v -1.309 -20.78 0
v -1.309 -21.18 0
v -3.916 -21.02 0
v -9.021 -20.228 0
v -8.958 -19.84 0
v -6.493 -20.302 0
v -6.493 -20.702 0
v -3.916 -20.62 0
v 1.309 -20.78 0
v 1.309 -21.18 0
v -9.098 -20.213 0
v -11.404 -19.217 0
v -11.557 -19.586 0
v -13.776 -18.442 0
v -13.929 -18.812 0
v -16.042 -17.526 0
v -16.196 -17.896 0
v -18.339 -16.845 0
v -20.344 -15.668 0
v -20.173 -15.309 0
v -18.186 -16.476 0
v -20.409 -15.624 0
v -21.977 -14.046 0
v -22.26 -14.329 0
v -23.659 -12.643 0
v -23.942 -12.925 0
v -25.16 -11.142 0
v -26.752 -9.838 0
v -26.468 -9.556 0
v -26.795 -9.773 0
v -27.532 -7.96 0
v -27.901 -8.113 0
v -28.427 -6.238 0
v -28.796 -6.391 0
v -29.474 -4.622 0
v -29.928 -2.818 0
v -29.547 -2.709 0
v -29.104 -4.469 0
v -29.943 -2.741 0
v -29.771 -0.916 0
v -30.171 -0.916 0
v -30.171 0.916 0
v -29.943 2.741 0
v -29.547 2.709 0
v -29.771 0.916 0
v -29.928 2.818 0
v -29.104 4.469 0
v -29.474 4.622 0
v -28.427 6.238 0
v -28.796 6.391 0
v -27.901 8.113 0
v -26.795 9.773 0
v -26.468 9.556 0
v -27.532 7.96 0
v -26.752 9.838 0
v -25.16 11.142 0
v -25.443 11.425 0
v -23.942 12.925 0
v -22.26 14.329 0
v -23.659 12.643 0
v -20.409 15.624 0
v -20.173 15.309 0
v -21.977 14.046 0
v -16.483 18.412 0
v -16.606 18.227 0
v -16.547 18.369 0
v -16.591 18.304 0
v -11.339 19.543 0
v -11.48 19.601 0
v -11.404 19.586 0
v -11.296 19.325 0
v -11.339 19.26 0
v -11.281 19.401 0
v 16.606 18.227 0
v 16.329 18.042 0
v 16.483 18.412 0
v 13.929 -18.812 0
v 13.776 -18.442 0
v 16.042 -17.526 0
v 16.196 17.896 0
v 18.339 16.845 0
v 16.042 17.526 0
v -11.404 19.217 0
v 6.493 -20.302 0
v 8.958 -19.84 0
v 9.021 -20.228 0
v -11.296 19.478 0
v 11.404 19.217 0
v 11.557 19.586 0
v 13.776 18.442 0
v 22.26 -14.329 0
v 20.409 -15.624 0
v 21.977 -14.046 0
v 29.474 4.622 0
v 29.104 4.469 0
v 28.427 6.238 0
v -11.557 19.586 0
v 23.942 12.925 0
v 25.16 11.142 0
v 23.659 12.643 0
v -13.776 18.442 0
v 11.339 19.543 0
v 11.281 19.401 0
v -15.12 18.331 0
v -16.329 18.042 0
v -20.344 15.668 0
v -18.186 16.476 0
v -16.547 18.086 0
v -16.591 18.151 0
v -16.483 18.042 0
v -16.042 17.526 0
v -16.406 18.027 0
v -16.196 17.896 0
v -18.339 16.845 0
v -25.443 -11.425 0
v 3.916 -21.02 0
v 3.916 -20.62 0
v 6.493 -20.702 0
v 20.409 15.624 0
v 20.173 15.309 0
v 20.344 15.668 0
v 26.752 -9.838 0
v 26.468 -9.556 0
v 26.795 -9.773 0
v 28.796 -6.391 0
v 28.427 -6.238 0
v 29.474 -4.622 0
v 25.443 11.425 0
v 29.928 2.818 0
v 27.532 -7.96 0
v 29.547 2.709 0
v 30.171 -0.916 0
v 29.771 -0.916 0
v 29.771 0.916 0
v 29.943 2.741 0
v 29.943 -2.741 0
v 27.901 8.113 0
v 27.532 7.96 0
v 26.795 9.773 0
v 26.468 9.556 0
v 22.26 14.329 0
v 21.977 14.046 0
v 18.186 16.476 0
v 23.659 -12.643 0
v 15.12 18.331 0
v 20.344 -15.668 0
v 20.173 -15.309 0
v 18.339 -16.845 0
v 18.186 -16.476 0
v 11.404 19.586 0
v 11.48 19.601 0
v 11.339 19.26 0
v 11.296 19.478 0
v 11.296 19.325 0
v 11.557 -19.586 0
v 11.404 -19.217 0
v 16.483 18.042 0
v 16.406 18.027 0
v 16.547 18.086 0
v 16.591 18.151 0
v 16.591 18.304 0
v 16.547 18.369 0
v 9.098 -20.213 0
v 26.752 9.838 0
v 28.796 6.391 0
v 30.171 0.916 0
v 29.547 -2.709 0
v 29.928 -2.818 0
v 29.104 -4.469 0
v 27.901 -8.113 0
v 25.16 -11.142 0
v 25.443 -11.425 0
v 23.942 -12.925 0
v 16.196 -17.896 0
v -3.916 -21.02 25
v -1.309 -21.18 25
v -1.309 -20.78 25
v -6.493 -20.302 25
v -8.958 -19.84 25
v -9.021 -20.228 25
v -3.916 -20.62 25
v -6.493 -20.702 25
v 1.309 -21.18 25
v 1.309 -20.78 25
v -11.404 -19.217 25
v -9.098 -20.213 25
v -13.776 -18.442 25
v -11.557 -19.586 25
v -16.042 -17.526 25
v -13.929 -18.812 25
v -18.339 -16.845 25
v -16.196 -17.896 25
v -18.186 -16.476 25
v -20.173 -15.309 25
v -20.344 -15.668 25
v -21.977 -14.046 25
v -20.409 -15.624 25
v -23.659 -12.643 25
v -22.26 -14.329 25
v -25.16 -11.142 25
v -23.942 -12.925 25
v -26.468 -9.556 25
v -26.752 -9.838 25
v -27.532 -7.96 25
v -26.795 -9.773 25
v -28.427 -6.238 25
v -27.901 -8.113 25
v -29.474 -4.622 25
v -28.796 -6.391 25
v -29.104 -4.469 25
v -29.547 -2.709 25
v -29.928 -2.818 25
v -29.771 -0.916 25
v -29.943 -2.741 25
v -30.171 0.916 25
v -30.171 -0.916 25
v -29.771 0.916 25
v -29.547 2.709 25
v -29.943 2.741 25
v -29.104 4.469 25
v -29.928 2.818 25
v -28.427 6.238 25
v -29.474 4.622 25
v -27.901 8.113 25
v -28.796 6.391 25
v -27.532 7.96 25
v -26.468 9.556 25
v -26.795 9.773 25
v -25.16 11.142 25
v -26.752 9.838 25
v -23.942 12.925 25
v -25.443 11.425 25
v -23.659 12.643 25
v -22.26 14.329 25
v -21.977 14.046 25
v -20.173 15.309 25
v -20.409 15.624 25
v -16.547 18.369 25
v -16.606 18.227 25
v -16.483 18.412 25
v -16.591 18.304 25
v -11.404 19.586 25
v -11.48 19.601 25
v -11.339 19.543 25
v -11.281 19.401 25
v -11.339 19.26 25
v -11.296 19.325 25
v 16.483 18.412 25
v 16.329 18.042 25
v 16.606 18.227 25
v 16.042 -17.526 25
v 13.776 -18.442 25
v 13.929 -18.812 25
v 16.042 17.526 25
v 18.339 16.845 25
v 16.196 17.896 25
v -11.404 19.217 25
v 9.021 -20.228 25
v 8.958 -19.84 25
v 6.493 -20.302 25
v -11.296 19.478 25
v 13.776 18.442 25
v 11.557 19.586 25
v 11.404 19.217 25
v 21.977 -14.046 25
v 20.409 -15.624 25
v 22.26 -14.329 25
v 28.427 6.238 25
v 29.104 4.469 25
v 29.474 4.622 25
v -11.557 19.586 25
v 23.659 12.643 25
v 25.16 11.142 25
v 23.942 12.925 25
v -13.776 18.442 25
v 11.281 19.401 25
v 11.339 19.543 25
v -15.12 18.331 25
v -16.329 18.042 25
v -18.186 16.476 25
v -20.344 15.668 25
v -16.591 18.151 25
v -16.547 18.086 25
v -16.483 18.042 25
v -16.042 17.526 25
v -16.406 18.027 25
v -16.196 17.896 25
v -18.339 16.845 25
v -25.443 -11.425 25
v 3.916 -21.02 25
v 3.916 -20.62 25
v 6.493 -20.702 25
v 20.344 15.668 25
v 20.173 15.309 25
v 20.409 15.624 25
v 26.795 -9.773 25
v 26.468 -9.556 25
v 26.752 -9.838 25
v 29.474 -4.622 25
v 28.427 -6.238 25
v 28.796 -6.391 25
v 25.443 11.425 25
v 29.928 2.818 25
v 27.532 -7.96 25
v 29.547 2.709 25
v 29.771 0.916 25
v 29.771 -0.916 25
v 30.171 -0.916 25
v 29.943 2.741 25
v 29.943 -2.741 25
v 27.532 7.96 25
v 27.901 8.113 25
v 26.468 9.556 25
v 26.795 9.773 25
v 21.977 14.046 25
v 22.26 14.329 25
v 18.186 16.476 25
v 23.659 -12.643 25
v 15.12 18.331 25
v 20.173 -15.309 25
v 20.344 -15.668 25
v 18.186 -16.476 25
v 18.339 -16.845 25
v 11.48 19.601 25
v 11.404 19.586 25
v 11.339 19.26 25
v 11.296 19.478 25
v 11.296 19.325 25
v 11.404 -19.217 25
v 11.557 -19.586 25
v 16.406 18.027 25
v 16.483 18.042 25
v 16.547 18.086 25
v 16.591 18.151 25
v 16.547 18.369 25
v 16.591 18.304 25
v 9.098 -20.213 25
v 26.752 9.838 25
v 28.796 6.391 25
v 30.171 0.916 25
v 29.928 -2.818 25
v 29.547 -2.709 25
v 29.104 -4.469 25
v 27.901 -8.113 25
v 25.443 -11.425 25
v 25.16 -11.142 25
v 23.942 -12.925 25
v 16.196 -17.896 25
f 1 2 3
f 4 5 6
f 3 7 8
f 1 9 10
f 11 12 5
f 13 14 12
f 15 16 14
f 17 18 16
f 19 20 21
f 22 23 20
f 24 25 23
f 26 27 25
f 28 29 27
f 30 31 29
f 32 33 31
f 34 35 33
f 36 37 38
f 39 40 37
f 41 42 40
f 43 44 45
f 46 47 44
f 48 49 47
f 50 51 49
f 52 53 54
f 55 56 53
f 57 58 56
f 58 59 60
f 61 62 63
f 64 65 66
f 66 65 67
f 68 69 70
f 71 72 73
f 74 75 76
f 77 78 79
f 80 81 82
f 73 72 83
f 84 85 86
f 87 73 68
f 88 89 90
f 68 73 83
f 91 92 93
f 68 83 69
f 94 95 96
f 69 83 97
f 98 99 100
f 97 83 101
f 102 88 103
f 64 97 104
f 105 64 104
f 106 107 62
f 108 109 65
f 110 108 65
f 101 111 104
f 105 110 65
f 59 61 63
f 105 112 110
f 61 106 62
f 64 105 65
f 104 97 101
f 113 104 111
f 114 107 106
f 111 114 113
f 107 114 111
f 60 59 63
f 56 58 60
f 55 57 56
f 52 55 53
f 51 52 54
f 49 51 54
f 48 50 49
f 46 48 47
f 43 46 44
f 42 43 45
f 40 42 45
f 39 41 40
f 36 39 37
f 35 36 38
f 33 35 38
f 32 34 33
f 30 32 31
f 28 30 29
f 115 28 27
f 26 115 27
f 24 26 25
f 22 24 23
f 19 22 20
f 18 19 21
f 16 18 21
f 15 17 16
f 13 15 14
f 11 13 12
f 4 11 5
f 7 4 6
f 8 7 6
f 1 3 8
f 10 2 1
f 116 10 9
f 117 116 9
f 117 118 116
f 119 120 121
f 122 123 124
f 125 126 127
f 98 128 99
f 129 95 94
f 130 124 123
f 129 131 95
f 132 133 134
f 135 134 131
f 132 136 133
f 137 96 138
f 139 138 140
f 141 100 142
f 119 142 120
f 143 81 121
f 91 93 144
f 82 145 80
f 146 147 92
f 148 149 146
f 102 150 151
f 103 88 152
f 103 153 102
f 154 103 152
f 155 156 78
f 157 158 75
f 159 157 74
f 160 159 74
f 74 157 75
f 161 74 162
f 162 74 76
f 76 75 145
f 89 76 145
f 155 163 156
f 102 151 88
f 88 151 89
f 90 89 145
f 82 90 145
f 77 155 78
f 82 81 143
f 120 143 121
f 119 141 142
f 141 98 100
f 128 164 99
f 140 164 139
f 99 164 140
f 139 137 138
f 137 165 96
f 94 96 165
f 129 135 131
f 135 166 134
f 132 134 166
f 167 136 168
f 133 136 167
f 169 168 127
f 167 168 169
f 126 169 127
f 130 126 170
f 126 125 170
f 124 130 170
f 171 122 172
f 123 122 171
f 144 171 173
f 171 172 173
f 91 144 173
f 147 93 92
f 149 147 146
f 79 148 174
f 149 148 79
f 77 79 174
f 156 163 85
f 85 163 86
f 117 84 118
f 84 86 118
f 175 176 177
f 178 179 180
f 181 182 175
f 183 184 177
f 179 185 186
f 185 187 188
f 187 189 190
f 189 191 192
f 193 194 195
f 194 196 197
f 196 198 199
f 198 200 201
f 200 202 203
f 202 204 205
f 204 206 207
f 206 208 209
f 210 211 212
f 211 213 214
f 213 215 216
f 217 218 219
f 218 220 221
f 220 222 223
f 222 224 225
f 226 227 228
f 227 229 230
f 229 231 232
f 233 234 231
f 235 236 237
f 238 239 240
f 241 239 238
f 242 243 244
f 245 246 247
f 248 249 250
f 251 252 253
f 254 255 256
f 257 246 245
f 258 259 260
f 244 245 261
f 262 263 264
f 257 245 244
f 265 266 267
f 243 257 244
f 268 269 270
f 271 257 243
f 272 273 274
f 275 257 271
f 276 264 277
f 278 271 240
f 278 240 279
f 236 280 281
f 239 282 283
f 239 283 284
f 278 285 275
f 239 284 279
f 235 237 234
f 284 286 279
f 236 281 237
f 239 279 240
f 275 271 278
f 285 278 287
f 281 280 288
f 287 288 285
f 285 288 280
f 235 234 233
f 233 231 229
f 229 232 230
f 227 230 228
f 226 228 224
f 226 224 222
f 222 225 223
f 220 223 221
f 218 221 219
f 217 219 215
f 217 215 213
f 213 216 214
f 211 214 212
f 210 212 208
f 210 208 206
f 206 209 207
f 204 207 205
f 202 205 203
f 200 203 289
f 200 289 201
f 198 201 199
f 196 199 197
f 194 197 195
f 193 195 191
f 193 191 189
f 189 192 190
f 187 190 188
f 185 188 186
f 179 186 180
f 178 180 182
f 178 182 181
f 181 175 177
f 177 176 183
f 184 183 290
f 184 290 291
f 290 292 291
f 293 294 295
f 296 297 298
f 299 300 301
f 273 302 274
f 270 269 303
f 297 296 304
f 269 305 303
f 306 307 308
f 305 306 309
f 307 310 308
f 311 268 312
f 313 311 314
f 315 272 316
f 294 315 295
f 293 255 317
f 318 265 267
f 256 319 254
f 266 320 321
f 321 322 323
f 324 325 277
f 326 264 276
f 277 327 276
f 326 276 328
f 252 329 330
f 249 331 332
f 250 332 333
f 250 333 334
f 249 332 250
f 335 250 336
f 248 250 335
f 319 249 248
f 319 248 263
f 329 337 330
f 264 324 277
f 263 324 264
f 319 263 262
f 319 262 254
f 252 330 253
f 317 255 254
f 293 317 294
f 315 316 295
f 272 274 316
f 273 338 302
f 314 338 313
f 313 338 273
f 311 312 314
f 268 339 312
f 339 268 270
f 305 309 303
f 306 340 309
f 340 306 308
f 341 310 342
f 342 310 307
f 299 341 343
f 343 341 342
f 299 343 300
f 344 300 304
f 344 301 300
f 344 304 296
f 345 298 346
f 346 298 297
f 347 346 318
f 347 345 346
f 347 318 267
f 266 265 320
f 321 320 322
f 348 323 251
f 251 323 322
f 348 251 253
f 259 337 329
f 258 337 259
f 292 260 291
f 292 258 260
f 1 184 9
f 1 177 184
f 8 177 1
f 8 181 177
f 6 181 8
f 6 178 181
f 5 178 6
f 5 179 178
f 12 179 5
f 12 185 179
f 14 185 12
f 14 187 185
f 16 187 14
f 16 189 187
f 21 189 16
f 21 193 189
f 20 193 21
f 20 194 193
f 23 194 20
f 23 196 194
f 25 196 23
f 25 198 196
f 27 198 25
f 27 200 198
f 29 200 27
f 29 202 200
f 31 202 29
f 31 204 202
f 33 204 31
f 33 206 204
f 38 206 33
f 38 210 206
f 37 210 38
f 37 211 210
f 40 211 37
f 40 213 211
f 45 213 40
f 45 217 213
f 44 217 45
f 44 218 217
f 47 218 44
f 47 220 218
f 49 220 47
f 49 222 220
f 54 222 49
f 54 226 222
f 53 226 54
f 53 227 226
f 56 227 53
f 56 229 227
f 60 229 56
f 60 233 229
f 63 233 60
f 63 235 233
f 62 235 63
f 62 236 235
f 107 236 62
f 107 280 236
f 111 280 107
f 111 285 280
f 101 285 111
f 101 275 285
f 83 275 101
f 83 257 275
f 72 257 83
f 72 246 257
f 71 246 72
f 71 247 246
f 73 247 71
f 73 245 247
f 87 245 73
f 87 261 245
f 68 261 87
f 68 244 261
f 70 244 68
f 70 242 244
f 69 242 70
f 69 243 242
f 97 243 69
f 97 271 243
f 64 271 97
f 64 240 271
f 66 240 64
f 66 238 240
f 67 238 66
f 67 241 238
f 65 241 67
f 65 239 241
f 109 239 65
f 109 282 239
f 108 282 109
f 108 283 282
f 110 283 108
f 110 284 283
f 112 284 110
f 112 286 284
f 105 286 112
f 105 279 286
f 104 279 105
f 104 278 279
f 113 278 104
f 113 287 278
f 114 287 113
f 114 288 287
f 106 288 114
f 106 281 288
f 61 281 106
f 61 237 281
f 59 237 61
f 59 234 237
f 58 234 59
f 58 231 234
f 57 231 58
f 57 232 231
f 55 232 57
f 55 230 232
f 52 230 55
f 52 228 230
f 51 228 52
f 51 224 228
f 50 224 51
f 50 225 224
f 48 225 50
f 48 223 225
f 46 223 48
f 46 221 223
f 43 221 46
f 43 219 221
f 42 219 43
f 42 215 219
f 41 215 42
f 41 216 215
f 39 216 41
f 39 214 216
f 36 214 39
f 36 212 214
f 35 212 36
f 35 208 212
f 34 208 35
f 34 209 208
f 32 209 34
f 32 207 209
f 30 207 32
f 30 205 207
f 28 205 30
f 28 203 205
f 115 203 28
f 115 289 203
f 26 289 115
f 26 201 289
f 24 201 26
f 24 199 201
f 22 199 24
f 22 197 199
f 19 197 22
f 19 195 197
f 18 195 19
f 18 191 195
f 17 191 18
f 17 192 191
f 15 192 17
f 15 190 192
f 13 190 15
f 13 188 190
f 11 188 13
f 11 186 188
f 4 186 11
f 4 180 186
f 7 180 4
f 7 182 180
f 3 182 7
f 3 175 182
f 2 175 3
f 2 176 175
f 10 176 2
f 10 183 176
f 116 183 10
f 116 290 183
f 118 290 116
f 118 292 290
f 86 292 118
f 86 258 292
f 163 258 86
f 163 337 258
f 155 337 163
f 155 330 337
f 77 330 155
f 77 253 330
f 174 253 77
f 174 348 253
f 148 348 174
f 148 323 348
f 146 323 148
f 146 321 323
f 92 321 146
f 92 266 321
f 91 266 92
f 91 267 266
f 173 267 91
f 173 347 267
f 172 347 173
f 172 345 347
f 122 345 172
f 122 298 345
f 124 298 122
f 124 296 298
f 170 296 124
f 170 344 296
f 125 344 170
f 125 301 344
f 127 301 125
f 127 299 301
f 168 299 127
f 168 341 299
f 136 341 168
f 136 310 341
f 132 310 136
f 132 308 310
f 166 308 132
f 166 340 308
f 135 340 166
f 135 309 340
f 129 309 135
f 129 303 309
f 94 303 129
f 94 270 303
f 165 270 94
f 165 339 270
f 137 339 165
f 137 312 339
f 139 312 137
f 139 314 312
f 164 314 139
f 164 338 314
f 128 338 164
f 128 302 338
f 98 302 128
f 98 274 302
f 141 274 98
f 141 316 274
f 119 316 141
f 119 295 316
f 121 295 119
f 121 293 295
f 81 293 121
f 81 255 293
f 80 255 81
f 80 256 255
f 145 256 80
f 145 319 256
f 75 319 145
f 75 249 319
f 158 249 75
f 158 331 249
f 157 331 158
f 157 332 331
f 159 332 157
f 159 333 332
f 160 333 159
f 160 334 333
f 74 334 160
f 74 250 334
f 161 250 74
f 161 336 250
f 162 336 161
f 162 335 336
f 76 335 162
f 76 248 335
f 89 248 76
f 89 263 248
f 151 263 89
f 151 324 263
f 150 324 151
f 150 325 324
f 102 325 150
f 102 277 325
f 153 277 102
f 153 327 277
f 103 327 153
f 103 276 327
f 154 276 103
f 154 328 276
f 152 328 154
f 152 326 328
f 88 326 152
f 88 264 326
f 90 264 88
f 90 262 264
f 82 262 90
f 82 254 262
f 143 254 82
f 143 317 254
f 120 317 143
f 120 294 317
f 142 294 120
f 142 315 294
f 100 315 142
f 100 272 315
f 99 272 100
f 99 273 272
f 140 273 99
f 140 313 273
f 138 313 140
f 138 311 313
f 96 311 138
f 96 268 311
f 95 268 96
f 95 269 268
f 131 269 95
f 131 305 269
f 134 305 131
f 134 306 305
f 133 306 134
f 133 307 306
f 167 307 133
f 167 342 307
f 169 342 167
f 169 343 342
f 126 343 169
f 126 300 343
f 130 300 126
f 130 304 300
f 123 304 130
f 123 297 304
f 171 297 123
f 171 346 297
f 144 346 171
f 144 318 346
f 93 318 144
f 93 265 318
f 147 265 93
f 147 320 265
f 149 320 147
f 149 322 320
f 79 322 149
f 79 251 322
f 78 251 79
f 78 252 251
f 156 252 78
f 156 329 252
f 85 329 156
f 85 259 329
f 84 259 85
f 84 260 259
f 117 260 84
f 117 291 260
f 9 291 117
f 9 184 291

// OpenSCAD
// --- Parameters ---
wrist_width    = 60;       // Width of wrist (X-axis)
wrist_depth    = 42;       // Depth of wrist (Y-axis)
wall_thickness = 0.4;      // Thickness of the band wall
wall_height    = 25;       // Width of the band on the wrist
open_angle     = 45;       // Gap size at the top in degrees
hook_length    = 5;        // How far the hook reaches backward
$fn            = 64;       // Smoothness of the curves

// --- Point Generation ---
x_radius = wrist_width / 2;
y_radius = wrist_depth / 2;
start_angle = open_angle / 2;
end_angle = 360 - (open_angle / 2);
step = 5; 

// Generate the Oval C-shape arc points using independent X and Y radii
arc_points = [
    for (a = [start_angle : step : end_angle]) 
        [x_radius * sin(a), y_radius * cos(a)]
];

// Reference the exact start and end points of the arc
p_start = arc_points[0];
p_end   = arc_points[len(arc_points)-1];

// Outward and backward vector calculations adjusted for the oval angle
dir_out_start  = [sin(start_angle), cos(start_angle)];
dir_back_start = [cos(start_angle), -sin(start_angle)]; 
hook_tip_start = p_start + (dir_out_start * wall_thickness * 2) + (dir_back_start * hook_length);

dir_out_end    = [sin(end_angle), cos(end_angle)];
dir_back_end   = [-cos(end_angle), sin(end_angle)];   
hook_tip_end   = p_end + (dir_out_end * wall_thickness * 2) + (dir_back_end * hook_length);

// Combine all points into a single continuous path
points = concat(
    [hook_tip_start], 
    arc_points, 
    [hook_tip_end]
);

// --- 3D Extrusion ---
linear_extrude(height = wall_height) {
    poly_line(points, wall_thickness);
}

// --- Your Original Module ---
module poly_line(pts, thickness) {
    for (i = [0 : len(pts) - 2]) {
        hull() {
            translate(pts[i]) circle(d = thickness, $fn = 16);
            translate(pts[i+1]) circle(d = thickness, $fn = 16);
        }
    }
}
